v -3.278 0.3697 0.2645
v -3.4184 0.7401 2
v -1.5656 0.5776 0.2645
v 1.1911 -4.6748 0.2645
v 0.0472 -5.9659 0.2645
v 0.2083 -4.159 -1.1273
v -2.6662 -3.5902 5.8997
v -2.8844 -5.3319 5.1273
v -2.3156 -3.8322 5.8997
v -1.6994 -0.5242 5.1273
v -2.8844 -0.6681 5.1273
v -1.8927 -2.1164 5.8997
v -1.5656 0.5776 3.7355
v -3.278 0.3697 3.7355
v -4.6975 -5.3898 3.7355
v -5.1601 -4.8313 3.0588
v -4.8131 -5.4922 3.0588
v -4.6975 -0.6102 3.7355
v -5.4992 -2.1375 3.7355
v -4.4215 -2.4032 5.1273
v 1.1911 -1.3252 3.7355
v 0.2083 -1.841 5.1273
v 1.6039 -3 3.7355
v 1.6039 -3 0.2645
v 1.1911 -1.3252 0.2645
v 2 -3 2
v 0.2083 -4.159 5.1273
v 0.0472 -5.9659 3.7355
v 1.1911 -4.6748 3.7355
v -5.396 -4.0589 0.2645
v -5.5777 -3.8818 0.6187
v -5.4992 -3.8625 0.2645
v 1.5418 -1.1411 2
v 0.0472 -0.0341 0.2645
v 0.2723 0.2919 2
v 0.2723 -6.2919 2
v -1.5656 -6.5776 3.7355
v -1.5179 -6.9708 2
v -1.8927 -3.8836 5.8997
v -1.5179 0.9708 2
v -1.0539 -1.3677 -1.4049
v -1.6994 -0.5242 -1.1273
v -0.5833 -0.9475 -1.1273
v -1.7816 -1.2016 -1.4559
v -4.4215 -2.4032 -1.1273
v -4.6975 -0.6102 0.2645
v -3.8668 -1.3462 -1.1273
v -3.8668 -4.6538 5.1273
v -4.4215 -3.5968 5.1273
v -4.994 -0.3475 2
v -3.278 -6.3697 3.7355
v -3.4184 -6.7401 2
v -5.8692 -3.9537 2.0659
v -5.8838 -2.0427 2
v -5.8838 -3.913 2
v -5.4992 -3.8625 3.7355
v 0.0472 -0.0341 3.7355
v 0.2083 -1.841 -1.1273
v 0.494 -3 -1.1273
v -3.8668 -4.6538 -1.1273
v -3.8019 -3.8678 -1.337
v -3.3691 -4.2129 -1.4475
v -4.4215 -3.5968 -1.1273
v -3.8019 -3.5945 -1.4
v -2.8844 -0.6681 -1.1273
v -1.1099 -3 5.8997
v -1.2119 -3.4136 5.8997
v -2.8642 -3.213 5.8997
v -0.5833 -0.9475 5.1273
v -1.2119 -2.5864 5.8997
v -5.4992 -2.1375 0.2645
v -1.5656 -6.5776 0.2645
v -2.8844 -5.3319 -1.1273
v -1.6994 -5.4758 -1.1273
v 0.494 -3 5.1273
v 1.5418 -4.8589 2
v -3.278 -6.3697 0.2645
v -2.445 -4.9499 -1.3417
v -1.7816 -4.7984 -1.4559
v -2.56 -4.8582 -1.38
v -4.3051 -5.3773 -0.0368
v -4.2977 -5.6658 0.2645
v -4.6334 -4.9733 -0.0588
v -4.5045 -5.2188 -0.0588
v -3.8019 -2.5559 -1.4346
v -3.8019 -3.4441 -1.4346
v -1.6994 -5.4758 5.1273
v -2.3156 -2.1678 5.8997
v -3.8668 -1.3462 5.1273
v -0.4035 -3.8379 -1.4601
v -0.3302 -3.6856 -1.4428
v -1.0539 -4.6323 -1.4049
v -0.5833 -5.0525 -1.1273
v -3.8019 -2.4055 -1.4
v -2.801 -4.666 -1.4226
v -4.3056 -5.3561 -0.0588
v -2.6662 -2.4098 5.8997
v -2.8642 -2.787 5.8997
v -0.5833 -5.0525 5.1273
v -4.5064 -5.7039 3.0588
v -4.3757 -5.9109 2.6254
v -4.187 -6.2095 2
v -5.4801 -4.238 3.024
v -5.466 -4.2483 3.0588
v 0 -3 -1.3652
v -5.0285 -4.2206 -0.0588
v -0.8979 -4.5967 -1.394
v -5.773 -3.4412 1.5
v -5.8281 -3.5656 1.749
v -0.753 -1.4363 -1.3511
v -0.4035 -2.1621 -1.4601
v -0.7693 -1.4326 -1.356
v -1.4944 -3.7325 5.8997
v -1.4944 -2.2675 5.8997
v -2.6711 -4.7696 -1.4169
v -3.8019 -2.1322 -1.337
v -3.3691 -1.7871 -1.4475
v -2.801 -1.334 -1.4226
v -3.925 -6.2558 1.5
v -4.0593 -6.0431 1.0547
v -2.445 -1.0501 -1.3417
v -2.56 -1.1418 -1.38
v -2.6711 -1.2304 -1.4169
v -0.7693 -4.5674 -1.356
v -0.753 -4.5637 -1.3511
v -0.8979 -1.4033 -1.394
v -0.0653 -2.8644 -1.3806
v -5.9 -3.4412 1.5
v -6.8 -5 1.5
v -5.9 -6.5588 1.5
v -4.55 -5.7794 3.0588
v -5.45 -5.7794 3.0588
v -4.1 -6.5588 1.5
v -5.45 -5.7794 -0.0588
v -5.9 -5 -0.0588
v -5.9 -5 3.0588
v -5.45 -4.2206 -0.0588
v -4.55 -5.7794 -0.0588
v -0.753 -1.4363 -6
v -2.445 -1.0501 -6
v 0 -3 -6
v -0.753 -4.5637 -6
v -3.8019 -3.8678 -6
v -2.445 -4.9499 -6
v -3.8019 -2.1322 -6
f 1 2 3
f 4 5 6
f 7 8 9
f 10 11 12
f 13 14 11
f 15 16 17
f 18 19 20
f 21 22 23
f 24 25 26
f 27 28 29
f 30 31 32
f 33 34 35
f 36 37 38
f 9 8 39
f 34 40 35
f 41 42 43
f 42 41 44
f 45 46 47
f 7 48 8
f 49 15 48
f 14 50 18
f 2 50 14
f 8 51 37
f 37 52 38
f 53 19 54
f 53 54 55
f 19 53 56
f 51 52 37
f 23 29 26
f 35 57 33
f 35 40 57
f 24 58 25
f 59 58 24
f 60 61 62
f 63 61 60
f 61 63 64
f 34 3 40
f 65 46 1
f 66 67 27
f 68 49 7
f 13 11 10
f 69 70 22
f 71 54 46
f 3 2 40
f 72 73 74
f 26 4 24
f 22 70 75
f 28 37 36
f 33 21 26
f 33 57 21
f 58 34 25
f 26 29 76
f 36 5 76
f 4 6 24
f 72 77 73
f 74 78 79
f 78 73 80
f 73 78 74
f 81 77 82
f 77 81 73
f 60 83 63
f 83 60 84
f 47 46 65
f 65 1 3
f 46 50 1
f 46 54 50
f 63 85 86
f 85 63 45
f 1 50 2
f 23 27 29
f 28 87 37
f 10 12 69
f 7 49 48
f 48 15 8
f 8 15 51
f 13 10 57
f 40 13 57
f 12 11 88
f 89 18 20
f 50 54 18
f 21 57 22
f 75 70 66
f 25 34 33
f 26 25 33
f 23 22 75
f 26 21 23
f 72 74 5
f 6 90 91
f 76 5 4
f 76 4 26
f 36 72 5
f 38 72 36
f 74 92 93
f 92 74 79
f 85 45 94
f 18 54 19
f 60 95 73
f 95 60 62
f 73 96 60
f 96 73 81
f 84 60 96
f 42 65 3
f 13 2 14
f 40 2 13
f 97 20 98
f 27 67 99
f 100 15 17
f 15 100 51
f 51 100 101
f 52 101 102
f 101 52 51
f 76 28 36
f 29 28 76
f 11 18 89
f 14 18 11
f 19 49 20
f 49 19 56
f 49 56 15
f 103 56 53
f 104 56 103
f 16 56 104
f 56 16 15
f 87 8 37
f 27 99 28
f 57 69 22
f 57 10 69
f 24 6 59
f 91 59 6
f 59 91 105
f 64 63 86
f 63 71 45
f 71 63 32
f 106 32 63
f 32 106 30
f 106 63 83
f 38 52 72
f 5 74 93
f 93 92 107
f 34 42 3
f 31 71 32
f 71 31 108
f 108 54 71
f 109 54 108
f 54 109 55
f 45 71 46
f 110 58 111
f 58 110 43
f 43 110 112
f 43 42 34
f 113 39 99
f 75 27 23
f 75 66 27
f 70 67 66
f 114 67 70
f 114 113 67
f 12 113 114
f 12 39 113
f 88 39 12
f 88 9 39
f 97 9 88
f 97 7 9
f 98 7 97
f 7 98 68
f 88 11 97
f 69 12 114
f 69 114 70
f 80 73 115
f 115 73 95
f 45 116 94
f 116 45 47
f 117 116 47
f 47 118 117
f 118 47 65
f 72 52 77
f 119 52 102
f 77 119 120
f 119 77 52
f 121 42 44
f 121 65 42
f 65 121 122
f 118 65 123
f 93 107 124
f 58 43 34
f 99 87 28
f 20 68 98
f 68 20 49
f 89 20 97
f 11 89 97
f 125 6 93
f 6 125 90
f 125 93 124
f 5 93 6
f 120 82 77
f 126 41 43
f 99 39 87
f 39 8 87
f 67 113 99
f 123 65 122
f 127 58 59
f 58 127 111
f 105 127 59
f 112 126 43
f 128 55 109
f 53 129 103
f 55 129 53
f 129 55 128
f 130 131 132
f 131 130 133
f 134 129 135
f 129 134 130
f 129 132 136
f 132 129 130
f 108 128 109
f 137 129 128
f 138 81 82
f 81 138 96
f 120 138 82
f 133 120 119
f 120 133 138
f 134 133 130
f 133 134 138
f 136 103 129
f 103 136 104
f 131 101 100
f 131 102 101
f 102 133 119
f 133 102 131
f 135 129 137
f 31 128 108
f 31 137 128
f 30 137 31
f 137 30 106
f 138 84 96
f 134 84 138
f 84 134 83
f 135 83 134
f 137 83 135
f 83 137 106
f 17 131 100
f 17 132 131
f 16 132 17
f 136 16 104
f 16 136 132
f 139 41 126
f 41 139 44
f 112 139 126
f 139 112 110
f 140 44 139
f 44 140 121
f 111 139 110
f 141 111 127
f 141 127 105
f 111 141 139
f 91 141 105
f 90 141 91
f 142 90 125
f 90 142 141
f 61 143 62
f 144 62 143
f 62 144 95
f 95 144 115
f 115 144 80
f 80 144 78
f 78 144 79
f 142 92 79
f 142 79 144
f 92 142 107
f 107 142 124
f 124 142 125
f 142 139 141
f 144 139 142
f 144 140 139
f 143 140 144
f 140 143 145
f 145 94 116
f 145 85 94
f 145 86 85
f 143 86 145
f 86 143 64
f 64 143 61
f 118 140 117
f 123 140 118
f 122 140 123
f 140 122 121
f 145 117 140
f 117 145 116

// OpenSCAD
translate ([-2,-3,2]) {
	color("blue")
	sphere (4);
	}

translate ([-5,-5,1.5]) {
	color("green")
	sphere (1.8);
	}

translate ([-2,-3,-6]) {
	color("green")
	cylinder(6,2,2);
	}
